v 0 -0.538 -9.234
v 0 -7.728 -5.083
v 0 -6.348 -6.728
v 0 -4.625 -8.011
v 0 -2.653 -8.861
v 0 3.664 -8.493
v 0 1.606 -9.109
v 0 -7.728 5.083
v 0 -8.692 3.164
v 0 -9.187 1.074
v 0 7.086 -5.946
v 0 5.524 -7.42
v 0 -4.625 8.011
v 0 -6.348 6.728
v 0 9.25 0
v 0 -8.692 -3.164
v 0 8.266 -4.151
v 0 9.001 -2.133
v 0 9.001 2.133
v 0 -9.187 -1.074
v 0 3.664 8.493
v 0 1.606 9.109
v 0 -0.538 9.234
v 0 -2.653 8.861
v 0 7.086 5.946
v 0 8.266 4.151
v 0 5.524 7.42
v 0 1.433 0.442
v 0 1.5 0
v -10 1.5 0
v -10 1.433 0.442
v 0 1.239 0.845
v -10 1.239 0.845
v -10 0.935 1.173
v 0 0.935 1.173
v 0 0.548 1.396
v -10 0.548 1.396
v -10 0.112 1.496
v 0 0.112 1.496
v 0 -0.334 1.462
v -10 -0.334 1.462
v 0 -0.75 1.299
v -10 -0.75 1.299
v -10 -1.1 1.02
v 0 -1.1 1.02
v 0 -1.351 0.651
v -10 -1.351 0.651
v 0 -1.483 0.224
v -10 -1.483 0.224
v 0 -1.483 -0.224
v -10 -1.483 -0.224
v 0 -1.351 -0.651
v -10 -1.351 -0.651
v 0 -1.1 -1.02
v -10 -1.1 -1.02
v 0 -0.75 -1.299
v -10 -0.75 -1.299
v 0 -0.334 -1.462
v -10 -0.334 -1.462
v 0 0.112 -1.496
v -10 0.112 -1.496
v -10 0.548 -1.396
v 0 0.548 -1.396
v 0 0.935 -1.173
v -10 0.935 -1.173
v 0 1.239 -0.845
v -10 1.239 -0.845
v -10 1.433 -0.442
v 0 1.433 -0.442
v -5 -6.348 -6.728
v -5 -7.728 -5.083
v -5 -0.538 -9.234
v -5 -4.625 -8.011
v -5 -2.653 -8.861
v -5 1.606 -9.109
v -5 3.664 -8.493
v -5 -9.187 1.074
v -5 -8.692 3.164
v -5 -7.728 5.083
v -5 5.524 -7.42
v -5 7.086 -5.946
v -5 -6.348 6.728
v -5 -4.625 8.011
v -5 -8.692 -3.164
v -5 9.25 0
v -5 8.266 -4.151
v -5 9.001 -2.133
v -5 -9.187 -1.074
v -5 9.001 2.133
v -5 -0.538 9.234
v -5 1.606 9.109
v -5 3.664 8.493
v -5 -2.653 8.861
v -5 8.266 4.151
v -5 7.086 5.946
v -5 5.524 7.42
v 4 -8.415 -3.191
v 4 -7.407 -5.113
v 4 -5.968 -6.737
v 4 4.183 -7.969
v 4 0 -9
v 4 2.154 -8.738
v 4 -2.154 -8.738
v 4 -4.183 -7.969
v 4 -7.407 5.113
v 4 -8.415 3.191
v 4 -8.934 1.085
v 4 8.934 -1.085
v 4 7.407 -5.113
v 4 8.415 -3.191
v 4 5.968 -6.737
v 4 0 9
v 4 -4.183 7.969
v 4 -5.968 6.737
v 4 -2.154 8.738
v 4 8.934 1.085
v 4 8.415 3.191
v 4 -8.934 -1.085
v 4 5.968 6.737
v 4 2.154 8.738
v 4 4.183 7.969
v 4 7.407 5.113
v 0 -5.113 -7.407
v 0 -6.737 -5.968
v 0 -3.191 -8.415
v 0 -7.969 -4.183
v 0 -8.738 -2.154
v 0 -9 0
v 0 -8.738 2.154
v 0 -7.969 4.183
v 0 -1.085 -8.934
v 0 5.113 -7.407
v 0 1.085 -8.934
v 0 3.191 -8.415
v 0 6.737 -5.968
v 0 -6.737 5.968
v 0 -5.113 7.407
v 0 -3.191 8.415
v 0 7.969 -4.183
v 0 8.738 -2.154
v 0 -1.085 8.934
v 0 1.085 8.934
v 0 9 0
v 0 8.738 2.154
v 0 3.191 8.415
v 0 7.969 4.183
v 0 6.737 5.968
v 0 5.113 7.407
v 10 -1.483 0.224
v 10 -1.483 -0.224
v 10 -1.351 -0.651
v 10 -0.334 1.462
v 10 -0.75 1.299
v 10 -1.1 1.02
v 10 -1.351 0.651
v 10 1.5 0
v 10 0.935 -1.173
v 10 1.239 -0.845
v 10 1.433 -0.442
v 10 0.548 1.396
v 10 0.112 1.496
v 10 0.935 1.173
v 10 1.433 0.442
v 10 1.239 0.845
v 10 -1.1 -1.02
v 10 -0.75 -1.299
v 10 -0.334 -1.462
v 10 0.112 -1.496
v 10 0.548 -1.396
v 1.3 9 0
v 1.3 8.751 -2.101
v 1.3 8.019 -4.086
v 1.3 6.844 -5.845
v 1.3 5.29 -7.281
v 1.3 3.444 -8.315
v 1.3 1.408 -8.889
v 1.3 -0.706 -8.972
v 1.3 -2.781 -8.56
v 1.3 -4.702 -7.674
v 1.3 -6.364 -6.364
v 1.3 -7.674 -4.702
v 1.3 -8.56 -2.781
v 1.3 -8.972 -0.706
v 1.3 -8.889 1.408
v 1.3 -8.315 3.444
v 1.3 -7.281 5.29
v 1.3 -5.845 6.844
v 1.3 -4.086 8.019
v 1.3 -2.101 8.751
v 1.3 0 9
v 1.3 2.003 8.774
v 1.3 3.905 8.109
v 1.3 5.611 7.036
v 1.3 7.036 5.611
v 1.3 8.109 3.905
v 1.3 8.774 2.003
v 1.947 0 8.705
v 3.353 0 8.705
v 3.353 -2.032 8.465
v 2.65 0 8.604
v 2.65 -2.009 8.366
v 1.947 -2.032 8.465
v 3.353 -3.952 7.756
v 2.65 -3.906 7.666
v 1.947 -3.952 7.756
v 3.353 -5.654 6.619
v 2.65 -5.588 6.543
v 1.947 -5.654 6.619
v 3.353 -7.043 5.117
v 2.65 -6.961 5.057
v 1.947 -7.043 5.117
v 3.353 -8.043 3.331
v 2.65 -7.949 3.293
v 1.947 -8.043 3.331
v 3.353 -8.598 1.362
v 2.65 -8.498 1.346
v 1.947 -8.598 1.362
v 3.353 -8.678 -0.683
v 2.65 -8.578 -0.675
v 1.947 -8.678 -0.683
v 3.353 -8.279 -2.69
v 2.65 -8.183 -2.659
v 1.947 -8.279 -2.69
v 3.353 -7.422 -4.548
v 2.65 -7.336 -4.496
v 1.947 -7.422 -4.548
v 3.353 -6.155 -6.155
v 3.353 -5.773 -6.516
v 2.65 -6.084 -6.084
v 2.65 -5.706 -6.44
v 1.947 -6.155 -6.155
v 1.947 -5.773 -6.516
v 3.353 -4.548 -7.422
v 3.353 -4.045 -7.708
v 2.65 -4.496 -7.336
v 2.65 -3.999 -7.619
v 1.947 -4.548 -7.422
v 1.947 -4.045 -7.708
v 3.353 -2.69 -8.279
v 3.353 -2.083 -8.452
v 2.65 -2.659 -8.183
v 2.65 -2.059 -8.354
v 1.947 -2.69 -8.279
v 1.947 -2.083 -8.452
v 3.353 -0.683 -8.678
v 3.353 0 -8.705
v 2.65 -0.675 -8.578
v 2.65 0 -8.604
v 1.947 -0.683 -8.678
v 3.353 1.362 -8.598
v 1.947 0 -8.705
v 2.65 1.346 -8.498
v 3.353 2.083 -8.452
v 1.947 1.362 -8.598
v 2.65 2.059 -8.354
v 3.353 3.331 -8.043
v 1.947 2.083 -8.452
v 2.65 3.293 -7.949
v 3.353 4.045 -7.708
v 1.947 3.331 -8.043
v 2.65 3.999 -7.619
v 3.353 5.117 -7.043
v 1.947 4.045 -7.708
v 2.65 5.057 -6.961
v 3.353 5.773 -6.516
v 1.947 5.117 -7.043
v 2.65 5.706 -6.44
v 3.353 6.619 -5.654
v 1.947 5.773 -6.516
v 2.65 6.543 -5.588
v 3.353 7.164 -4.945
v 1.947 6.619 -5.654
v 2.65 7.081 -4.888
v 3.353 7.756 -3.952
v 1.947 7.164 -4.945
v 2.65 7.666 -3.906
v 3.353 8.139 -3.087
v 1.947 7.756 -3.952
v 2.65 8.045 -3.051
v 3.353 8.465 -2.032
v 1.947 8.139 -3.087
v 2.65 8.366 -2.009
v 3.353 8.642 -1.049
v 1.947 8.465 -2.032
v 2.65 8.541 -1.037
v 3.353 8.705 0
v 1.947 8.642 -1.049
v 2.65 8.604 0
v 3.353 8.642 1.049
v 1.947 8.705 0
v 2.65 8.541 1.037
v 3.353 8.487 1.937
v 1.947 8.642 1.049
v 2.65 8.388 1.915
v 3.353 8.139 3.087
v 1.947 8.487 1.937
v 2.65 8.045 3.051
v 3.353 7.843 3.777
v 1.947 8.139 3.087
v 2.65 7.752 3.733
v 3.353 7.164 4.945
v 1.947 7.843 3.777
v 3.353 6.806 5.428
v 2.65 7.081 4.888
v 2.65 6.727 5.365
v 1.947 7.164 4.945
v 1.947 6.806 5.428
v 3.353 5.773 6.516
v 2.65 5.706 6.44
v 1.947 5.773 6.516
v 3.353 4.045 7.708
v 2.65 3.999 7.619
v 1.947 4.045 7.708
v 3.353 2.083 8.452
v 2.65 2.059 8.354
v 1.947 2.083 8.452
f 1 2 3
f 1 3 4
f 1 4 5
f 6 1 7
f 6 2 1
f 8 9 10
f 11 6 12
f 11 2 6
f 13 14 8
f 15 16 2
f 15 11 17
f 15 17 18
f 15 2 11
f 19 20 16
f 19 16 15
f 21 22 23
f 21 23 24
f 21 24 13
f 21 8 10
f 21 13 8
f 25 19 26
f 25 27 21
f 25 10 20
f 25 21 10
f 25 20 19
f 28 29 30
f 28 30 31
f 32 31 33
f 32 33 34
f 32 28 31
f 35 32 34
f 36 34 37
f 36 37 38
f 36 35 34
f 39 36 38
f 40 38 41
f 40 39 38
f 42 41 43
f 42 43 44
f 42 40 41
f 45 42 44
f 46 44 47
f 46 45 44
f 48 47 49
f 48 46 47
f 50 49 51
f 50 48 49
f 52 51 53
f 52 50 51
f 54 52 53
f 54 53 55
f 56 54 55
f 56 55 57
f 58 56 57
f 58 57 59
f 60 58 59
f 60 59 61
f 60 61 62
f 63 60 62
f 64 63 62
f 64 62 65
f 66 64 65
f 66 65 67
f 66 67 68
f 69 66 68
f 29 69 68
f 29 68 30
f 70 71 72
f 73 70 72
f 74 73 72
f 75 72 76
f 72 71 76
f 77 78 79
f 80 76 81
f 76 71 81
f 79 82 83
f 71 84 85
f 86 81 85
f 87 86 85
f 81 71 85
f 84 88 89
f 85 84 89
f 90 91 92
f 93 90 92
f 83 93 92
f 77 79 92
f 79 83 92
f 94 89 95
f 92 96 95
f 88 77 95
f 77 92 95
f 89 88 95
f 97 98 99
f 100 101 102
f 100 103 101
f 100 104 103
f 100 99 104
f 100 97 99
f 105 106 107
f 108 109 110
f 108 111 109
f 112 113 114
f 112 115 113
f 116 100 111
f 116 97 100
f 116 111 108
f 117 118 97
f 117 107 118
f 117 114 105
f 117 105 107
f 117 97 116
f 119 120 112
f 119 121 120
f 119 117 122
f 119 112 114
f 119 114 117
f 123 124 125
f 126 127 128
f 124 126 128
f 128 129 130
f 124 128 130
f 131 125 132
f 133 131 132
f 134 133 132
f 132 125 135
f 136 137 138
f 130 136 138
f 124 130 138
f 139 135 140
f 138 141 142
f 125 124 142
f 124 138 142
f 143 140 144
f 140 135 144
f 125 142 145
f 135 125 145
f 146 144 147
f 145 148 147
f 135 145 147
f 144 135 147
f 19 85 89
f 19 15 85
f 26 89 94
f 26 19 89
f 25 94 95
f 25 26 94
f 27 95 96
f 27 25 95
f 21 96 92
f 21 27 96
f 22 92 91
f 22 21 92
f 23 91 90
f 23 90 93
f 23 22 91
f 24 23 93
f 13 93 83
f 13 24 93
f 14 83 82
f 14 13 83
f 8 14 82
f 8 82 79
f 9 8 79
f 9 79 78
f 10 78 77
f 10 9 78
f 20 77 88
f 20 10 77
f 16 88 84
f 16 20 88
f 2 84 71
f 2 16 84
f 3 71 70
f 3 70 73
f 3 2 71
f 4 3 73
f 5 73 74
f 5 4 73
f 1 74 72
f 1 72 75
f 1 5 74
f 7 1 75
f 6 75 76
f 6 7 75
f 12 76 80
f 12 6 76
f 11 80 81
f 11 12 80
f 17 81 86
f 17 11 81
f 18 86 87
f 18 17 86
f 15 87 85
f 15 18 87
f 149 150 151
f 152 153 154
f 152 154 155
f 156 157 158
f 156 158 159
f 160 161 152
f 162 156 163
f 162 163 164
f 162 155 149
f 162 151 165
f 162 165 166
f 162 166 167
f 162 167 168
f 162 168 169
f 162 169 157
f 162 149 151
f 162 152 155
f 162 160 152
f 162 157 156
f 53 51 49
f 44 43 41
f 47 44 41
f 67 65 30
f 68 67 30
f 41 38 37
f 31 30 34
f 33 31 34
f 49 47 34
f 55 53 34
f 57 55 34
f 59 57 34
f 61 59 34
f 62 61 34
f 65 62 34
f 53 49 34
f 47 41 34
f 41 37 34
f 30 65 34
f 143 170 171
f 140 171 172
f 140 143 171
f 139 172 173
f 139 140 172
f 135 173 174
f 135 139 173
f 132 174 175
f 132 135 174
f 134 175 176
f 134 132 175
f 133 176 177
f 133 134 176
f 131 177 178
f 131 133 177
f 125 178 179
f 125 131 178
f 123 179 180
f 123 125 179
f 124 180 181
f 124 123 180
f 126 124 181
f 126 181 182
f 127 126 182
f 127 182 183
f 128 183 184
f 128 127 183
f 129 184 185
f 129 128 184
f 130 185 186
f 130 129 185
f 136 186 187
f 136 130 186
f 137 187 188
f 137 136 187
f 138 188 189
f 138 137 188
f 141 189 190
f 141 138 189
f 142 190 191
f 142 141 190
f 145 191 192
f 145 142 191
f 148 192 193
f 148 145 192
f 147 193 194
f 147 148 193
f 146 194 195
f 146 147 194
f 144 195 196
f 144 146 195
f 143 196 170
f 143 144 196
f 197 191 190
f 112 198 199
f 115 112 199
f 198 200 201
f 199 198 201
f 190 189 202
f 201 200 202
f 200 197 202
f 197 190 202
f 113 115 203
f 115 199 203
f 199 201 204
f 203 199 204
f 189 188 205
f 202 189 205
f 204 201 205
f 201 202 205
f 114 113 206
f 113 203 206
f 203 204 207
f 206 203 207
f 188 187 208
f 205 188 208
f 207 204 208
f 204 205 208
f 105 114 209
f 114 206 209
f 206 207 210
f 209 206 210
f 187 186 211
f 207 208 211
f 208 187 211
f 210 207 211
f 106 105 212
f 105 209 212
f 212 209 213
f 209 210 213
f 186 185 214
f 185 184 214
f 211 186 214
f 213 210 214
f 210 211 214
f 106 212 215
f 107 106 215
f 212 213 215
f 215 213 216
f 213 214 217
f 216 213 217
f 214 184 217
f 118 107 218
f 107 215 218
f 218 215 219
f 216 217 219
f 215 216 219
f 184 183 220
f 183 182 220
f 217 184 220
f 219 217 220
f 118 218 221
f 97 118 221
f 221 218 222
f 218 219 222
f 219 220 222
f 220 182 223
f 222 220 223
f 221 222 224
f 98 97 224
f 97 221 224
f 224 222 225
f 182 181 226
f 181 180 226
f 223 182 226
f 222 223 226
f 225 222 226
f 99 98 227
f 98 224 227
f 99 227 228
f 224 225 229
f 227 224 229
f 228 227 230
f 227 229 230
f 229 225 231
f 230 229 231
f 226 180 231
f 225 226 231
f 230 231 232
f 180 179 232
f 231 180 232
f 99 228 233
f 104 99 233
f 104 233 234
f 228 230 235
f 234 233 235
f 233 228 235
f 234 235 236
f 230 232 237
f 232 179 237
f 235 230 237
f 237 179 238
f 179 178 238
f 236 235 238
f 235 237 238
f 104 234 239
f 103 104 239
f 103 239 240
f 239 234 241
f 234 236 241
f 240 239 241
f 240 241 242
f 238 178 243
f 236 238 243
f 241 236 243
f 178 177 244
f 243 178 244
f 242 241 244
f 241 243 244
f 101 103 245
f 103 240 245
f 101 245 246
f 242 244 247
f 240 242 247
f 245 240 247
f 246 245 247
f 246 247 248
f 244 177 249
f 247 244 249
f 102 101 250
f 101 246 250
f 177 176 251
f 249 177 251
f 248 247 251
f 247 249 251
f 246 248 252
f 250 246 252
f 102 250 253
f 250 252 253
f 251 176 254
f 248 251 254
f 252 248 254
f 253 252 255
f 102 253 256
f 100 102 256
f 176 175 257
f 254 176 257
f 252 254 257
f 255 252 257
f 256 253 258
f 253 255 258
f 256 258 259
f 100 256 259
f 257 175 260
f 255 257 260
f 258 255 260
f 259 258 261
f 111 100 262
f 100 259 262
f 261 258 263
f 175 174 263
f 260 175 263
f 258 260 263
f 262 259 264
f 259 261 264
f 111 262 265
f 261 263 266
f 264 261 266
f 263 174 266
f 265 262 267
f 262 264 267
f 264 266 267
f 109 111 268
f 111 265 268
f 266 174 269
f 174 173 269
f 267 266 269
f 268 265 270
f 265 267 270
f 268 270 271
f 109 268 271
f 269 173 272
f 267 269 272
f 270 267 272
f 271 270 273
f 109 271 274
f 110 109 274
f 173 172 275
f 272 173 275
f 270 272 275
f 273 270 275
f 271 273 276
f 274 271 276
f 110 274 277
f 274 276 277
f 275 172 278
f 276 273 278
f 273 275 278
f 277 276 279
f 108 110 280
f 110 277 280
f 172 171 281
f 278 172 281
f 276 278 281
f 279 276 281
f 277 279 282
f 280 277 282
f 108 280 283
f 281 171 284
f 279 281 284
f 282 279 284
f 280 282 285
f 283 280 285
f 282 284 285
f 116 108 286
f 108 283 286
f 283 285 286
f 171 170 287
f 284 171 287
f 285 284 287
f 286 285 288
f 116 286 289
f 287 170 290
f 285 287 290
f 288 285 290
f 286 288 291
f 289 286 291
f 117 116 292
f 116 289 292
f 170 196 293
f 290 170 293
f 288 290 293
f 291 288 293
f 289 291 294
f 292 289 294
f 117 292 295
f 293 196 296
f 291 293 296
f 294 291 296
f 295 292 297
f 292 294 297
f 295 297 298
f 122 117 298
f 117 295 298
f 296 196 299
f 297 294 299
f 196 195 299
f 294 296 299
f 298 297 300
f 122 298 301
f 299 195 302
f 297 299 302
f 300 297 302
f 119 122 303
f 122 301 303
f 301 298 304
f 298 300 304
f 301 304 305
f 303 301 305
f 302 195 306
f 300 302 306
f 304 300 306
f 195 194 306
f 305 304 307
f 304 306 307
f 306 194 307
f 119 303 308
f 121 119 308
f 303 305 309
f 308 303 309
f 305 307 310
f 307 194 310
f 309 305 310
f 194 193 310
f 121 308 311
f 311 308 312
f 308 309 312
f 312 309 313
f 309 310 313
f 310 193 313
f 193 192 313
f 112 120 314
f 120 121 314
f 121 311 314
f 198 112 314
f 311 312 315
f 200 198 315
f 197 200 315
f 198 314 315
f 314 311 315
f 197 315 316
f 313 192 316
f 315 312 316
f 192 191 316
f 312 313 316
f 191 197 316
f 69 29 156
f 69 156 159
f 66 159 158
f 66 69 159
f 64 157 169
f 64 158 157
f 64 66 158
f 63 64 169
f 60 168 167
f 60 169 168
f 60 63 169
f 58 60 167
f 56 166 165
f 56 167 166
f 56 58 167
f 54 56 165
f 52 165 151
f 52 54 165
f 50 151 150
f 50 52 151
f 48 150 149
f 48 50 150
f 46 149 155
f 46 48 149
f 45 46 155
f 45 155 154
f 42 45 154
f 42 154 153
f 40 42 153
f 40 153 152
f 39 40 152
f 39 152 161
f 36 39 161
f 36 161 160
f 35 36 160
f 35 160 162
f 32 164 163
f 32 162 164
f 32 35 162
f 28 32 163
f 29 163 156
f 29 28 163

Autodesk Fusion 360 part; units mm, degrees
sketch "Sketch1" plane through (0, 0, 0) normal (1, 0, 0) x (0, 1, 0) in component "LGX Drive Gear (reference dia)"
  circle A0 centre (0, 0) radius 9.25
  circle A1 centre (0, 0) radius 9
  circle A2 centre (0, 0) radius 1.5
  dimension "d1" = 18.5
  dimension "d2" = 18
  dimension "d10" = 3
extrude "Extrude1" add sketch "Sketch1" against normal blind 5 contours A0 | A1 | A2 makes body 1 in component "LGX Drive Gear (reference dia)"
extrude "Extrude2" add sketch "Sketch1" along normal blind 4 separate body contours A1 | A2 makes body 2 in component "LGX Drive Gear (reference dia)"
sketch "Sketch2" plane through (0, 0, 0) normal (0, 1, 0) x (1, 0, 0) in component "LGX Drive Gear (reference dia)"
  line L0 (4, -9) -> (4, 9)
  line L1 (0, -9) -> (1.3, -9)
  arc A0 (4, -9) -> (1.3, -9) centre (2.65, -11.1042) ccw
  line L2 (1.3, -9) -> (4, -9)
  line L3 (0, -9) -> (0, 9)
  dimension "d7" = 1.3
  dimension "d8" = 2.5
revolve "Revolve1" cut sketch "Sketch2" angle 360 about axis through (1.75, 0, 0) along (1, 0, 0) bodies 2 in component "LGX Drive Gear (reference dia)"
extrude "Extrude1'" add sketch "Sketch1" along normal mid plane 20 separate body contours A2 makes body 3 in component "LGX Drive Gear (reference dia)"
component "LGX Drive Gear (reference dia)" placed x (1, 0, 0) y (0, 1, 0) z (0, 0, 1) at (0, 0, 0)
